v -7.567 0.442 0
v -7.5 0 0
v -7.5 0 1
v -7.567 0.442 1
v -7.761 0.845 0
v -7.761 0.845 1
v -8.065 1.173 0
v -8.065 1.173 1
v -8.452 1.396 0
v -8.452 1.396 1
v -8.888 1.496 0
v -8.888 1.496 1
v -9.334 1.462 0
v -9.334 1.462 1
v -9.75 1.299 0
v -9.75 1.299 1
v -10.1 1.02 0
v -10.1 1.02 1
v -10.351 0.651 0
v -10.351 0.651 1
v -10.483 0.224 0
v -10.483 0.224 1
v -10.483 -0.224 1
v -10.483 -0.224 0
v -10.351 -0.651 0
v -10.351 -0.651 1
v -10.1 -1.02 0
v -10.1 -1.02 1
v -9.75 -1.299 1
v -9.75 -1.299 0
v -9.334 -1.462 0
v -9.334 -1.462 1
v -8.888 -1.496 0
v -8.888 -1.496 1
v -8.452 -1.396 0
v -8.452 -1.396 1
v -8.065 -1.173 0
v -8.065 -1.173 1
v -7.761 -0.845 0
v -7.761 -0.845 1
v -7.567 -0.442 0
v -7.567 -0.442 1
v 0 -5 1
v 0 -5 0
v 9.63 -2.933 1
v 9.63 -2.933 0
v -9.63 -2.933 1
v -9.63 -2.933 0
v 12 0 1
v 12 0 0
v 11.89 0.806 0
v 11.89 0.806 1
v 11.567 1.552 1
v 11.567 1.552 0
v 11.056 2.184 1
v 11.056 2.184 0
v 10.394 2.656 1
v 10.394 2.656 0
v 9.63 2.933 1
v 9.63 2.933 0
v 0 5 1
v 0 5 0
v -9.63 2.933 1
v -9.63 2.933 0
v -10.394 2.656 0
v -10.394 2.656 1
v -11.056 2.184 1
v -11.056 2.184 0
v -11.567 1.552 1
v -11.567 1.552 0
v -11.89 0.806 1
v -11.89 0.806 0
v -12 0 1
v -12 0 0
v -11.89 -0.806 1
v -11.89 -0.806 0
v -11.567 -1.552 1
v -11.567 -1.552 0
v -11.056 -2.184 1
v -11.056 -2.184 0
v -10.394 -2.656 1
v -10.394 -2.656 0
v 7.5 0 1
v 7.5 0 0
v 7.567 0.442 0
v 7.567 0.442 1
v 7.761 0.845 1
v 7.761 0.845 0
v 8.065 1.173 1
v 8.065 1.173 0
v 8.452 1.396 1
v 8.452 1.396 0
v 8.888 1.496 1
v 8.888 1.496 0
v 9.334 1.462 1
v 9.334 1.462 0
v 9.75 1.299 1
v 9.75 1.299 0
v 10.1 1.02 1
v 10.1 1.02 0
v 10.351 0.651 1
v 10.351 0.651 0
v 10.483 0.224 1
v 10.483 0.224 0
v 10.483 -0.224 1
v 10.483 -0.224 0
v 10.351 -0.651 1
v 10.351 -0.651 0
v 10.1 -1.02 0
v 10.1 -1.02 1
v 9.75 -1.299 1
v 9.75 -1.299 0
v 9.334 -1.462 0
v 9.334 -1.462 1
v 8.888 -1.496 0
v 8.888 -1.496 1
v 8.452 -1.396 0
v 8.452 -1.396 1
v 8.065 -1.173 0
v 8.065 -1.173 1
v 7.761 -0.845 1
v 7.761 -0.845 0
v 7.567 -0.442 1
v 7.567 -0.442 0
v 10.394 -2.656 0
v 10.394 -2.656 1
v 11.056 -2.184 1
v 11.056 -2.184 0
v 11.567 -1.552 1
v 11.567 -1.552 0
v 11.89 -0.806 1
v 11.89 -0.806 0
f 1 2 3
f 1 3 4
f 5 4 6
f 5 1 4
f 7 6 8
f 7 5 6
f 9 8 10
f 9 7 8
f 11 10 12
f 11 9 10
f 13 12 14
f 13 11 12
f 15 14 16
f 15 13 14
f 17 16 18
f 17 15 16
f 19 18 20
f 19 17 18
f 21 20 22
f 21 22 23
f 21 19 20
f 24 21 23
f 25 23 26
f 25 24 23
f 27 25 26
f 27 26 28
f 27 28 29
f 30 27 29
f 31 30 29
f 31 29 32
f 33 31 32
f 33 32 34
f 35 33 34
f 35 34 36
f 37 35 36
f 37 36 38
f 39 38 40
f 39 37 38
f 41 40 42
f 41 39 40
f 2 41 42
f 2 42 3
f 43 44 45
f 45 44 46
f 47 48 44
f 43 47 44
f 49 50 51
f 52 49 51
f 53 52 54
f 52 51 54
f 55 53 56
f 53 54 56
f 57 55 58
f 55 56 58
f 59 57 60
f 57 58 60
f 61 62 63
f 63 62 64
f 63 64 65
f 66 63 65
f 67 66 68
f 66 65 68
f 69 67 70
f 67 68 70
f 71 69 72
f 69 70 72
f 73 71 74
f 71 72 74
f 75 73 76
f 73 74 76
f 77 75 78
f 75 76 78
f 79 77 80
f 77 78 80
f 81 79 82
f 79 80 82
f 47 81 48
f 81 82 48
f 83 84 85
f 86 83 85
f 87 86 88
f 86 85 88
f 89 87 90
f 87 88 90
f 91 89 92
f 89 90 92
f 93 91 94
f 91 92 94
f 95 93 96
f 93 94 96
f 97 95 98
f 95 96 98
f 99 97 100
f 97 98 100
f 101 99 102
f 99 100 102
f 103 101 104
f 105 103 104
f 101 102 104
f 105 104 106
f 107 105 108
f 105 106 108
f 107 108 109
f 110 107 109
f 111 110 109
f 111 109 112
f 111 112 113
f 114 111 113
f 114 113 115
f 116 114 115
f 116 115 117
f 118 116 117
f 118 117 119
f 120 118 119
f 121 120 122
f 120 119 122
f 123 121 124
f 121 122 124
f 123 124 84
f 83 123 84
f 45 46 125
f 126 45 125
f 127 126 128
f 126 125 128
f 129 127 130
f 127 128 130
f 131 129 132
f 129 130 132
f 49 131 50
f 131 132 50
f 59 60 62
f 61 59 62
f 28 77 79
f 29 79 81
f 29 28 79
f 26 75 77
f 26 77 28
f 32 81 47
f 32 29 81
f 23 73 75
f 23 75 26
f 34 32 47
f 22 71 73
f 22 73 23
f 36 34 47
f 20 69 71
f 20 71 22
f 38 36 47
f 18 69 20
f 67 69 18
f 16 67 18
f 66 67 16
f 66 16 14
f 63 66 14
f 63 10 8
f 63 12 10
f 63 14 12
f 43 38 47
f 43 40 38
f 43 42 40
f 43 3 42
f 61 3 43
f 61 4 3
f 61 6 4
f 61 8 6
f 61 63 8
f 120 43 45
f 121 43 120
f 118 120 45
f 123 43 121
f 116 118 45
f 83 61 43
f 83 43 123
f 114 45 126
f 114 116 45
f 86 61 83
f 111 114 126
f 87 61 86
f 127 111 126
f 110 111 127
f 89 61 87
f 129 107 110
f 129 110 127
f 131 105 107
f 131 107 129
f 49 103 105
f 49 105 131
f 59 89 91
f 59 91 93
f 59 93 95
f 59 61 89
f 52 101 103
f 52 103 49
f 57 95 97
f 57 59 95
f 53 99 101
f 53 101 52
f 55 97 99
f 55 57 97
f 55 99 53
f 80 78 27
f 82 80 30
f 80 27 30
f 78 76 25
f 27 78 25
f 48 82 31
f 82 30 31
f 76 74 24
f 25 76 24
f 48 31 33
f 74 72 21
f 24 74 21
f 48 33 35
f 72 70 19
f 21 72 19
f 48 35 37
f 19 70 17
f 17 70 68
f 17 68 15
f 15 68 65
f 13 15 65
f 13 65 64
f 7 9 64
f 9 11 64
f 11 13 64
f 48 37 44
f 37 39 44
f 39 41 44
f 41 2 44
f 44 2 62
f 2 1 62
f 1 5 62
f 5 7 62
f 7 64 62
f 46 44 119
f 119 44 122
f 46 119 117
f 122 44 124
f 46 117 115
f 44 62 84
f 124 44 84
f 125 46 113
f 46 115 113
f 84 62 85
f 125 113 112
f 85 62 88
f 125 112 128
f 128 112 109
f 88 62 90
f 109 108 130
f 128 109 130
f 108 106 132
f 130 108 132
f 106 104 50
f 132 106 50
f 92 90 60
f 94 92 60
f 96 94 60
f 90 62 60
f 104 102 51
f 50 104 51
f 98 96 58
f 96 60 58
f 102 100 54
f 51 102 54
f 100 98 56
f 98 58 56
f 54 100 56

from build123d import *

# Parameters (mm, degrees)
F0_R     = 1.5
F1_DEPTH = 1


with BuildPart() as f1:
    # F0 (on Top) → F1 (new body)
    with BuildSketch(Plane.XY):
        with BuildLine():
            Line((0, -5), (0, 0))
            Line((0, 0), (-6, 0))
            ThreePointArc((-6, 0), (-7.114352, -2.333309), (-9.629555, -2.9332))
            Line((-9.629555, -2.9332), (0, -5))
        make_face()
        with BuildLine():
            Line((-6, 0), (0, 0))
            Line((0, 0), (0, 5))
            Line((0, 5), (-9.629555, 2.9332))
            ThreePointArc((-9.629555, 2.9332), (-7.114352, 2.333309), (-6, 0))
        make_face()
        with BuildLine():
            Line((0, 5), (0, 0))
            Line((0, 0), (6, 0))
            ThreePointArc((6, 0), (7.114352, 2.333309), (9.629555, 2.9332))
            Line((9.629555, 2.9332), (0, 5))
        make_face()
        with BuildLine():
            Line((6, 0), (0, 0))
            Line((0, 0), (0, -5))
            Line((0, -5), (9.629555, -2.9332))
            ThreePointArc((9.629555, -2.9332), (7.114352, -2.333309), (6, 0))
        make_face()
        with BuildLine():
            ThreePointArc((9.629555, 2.9332), (7.114352, 2.333309), (6, 0))
            ThreePointArc((6, 0), (7.114352, -2.333309), (9.629555, -2.9332))
            ThreePointArc((9.629555, -2.9332), (11.333309, -1.885648), (12, 0))
            ThreePointArc((12, 0), (11.333309, 1.885648), (9.629555, 2.9332))
        make_face()
        with BuildLine():
            ThreePointArc((10.5, 0), (9, -1.5), (7.5, 0))
            ThreePointArc((7.5, 0), (9, 1.5), (10.5, 0))
        make_face(mode=Mode.SUBTRACT)
        with BuildLine():
            ThreePointArc((-9.629555, -2.9332), (-7.114352, -2.333309), (-6, 0))
            ThreePointArc((-6, 0), (-7.114352, 2.333309), (-9.629555, 2.9332))
            ThreePointArc((-9.629555, 2.9332), (-12, 0), (-9.629555, -2.9332))
        make_face()
        with Locations((-9, 0)):
            Circle(F0_R, mode=Mode.SUBTRACT)
    extrude(amount=F1_DEPTH)


solid = f1.part
